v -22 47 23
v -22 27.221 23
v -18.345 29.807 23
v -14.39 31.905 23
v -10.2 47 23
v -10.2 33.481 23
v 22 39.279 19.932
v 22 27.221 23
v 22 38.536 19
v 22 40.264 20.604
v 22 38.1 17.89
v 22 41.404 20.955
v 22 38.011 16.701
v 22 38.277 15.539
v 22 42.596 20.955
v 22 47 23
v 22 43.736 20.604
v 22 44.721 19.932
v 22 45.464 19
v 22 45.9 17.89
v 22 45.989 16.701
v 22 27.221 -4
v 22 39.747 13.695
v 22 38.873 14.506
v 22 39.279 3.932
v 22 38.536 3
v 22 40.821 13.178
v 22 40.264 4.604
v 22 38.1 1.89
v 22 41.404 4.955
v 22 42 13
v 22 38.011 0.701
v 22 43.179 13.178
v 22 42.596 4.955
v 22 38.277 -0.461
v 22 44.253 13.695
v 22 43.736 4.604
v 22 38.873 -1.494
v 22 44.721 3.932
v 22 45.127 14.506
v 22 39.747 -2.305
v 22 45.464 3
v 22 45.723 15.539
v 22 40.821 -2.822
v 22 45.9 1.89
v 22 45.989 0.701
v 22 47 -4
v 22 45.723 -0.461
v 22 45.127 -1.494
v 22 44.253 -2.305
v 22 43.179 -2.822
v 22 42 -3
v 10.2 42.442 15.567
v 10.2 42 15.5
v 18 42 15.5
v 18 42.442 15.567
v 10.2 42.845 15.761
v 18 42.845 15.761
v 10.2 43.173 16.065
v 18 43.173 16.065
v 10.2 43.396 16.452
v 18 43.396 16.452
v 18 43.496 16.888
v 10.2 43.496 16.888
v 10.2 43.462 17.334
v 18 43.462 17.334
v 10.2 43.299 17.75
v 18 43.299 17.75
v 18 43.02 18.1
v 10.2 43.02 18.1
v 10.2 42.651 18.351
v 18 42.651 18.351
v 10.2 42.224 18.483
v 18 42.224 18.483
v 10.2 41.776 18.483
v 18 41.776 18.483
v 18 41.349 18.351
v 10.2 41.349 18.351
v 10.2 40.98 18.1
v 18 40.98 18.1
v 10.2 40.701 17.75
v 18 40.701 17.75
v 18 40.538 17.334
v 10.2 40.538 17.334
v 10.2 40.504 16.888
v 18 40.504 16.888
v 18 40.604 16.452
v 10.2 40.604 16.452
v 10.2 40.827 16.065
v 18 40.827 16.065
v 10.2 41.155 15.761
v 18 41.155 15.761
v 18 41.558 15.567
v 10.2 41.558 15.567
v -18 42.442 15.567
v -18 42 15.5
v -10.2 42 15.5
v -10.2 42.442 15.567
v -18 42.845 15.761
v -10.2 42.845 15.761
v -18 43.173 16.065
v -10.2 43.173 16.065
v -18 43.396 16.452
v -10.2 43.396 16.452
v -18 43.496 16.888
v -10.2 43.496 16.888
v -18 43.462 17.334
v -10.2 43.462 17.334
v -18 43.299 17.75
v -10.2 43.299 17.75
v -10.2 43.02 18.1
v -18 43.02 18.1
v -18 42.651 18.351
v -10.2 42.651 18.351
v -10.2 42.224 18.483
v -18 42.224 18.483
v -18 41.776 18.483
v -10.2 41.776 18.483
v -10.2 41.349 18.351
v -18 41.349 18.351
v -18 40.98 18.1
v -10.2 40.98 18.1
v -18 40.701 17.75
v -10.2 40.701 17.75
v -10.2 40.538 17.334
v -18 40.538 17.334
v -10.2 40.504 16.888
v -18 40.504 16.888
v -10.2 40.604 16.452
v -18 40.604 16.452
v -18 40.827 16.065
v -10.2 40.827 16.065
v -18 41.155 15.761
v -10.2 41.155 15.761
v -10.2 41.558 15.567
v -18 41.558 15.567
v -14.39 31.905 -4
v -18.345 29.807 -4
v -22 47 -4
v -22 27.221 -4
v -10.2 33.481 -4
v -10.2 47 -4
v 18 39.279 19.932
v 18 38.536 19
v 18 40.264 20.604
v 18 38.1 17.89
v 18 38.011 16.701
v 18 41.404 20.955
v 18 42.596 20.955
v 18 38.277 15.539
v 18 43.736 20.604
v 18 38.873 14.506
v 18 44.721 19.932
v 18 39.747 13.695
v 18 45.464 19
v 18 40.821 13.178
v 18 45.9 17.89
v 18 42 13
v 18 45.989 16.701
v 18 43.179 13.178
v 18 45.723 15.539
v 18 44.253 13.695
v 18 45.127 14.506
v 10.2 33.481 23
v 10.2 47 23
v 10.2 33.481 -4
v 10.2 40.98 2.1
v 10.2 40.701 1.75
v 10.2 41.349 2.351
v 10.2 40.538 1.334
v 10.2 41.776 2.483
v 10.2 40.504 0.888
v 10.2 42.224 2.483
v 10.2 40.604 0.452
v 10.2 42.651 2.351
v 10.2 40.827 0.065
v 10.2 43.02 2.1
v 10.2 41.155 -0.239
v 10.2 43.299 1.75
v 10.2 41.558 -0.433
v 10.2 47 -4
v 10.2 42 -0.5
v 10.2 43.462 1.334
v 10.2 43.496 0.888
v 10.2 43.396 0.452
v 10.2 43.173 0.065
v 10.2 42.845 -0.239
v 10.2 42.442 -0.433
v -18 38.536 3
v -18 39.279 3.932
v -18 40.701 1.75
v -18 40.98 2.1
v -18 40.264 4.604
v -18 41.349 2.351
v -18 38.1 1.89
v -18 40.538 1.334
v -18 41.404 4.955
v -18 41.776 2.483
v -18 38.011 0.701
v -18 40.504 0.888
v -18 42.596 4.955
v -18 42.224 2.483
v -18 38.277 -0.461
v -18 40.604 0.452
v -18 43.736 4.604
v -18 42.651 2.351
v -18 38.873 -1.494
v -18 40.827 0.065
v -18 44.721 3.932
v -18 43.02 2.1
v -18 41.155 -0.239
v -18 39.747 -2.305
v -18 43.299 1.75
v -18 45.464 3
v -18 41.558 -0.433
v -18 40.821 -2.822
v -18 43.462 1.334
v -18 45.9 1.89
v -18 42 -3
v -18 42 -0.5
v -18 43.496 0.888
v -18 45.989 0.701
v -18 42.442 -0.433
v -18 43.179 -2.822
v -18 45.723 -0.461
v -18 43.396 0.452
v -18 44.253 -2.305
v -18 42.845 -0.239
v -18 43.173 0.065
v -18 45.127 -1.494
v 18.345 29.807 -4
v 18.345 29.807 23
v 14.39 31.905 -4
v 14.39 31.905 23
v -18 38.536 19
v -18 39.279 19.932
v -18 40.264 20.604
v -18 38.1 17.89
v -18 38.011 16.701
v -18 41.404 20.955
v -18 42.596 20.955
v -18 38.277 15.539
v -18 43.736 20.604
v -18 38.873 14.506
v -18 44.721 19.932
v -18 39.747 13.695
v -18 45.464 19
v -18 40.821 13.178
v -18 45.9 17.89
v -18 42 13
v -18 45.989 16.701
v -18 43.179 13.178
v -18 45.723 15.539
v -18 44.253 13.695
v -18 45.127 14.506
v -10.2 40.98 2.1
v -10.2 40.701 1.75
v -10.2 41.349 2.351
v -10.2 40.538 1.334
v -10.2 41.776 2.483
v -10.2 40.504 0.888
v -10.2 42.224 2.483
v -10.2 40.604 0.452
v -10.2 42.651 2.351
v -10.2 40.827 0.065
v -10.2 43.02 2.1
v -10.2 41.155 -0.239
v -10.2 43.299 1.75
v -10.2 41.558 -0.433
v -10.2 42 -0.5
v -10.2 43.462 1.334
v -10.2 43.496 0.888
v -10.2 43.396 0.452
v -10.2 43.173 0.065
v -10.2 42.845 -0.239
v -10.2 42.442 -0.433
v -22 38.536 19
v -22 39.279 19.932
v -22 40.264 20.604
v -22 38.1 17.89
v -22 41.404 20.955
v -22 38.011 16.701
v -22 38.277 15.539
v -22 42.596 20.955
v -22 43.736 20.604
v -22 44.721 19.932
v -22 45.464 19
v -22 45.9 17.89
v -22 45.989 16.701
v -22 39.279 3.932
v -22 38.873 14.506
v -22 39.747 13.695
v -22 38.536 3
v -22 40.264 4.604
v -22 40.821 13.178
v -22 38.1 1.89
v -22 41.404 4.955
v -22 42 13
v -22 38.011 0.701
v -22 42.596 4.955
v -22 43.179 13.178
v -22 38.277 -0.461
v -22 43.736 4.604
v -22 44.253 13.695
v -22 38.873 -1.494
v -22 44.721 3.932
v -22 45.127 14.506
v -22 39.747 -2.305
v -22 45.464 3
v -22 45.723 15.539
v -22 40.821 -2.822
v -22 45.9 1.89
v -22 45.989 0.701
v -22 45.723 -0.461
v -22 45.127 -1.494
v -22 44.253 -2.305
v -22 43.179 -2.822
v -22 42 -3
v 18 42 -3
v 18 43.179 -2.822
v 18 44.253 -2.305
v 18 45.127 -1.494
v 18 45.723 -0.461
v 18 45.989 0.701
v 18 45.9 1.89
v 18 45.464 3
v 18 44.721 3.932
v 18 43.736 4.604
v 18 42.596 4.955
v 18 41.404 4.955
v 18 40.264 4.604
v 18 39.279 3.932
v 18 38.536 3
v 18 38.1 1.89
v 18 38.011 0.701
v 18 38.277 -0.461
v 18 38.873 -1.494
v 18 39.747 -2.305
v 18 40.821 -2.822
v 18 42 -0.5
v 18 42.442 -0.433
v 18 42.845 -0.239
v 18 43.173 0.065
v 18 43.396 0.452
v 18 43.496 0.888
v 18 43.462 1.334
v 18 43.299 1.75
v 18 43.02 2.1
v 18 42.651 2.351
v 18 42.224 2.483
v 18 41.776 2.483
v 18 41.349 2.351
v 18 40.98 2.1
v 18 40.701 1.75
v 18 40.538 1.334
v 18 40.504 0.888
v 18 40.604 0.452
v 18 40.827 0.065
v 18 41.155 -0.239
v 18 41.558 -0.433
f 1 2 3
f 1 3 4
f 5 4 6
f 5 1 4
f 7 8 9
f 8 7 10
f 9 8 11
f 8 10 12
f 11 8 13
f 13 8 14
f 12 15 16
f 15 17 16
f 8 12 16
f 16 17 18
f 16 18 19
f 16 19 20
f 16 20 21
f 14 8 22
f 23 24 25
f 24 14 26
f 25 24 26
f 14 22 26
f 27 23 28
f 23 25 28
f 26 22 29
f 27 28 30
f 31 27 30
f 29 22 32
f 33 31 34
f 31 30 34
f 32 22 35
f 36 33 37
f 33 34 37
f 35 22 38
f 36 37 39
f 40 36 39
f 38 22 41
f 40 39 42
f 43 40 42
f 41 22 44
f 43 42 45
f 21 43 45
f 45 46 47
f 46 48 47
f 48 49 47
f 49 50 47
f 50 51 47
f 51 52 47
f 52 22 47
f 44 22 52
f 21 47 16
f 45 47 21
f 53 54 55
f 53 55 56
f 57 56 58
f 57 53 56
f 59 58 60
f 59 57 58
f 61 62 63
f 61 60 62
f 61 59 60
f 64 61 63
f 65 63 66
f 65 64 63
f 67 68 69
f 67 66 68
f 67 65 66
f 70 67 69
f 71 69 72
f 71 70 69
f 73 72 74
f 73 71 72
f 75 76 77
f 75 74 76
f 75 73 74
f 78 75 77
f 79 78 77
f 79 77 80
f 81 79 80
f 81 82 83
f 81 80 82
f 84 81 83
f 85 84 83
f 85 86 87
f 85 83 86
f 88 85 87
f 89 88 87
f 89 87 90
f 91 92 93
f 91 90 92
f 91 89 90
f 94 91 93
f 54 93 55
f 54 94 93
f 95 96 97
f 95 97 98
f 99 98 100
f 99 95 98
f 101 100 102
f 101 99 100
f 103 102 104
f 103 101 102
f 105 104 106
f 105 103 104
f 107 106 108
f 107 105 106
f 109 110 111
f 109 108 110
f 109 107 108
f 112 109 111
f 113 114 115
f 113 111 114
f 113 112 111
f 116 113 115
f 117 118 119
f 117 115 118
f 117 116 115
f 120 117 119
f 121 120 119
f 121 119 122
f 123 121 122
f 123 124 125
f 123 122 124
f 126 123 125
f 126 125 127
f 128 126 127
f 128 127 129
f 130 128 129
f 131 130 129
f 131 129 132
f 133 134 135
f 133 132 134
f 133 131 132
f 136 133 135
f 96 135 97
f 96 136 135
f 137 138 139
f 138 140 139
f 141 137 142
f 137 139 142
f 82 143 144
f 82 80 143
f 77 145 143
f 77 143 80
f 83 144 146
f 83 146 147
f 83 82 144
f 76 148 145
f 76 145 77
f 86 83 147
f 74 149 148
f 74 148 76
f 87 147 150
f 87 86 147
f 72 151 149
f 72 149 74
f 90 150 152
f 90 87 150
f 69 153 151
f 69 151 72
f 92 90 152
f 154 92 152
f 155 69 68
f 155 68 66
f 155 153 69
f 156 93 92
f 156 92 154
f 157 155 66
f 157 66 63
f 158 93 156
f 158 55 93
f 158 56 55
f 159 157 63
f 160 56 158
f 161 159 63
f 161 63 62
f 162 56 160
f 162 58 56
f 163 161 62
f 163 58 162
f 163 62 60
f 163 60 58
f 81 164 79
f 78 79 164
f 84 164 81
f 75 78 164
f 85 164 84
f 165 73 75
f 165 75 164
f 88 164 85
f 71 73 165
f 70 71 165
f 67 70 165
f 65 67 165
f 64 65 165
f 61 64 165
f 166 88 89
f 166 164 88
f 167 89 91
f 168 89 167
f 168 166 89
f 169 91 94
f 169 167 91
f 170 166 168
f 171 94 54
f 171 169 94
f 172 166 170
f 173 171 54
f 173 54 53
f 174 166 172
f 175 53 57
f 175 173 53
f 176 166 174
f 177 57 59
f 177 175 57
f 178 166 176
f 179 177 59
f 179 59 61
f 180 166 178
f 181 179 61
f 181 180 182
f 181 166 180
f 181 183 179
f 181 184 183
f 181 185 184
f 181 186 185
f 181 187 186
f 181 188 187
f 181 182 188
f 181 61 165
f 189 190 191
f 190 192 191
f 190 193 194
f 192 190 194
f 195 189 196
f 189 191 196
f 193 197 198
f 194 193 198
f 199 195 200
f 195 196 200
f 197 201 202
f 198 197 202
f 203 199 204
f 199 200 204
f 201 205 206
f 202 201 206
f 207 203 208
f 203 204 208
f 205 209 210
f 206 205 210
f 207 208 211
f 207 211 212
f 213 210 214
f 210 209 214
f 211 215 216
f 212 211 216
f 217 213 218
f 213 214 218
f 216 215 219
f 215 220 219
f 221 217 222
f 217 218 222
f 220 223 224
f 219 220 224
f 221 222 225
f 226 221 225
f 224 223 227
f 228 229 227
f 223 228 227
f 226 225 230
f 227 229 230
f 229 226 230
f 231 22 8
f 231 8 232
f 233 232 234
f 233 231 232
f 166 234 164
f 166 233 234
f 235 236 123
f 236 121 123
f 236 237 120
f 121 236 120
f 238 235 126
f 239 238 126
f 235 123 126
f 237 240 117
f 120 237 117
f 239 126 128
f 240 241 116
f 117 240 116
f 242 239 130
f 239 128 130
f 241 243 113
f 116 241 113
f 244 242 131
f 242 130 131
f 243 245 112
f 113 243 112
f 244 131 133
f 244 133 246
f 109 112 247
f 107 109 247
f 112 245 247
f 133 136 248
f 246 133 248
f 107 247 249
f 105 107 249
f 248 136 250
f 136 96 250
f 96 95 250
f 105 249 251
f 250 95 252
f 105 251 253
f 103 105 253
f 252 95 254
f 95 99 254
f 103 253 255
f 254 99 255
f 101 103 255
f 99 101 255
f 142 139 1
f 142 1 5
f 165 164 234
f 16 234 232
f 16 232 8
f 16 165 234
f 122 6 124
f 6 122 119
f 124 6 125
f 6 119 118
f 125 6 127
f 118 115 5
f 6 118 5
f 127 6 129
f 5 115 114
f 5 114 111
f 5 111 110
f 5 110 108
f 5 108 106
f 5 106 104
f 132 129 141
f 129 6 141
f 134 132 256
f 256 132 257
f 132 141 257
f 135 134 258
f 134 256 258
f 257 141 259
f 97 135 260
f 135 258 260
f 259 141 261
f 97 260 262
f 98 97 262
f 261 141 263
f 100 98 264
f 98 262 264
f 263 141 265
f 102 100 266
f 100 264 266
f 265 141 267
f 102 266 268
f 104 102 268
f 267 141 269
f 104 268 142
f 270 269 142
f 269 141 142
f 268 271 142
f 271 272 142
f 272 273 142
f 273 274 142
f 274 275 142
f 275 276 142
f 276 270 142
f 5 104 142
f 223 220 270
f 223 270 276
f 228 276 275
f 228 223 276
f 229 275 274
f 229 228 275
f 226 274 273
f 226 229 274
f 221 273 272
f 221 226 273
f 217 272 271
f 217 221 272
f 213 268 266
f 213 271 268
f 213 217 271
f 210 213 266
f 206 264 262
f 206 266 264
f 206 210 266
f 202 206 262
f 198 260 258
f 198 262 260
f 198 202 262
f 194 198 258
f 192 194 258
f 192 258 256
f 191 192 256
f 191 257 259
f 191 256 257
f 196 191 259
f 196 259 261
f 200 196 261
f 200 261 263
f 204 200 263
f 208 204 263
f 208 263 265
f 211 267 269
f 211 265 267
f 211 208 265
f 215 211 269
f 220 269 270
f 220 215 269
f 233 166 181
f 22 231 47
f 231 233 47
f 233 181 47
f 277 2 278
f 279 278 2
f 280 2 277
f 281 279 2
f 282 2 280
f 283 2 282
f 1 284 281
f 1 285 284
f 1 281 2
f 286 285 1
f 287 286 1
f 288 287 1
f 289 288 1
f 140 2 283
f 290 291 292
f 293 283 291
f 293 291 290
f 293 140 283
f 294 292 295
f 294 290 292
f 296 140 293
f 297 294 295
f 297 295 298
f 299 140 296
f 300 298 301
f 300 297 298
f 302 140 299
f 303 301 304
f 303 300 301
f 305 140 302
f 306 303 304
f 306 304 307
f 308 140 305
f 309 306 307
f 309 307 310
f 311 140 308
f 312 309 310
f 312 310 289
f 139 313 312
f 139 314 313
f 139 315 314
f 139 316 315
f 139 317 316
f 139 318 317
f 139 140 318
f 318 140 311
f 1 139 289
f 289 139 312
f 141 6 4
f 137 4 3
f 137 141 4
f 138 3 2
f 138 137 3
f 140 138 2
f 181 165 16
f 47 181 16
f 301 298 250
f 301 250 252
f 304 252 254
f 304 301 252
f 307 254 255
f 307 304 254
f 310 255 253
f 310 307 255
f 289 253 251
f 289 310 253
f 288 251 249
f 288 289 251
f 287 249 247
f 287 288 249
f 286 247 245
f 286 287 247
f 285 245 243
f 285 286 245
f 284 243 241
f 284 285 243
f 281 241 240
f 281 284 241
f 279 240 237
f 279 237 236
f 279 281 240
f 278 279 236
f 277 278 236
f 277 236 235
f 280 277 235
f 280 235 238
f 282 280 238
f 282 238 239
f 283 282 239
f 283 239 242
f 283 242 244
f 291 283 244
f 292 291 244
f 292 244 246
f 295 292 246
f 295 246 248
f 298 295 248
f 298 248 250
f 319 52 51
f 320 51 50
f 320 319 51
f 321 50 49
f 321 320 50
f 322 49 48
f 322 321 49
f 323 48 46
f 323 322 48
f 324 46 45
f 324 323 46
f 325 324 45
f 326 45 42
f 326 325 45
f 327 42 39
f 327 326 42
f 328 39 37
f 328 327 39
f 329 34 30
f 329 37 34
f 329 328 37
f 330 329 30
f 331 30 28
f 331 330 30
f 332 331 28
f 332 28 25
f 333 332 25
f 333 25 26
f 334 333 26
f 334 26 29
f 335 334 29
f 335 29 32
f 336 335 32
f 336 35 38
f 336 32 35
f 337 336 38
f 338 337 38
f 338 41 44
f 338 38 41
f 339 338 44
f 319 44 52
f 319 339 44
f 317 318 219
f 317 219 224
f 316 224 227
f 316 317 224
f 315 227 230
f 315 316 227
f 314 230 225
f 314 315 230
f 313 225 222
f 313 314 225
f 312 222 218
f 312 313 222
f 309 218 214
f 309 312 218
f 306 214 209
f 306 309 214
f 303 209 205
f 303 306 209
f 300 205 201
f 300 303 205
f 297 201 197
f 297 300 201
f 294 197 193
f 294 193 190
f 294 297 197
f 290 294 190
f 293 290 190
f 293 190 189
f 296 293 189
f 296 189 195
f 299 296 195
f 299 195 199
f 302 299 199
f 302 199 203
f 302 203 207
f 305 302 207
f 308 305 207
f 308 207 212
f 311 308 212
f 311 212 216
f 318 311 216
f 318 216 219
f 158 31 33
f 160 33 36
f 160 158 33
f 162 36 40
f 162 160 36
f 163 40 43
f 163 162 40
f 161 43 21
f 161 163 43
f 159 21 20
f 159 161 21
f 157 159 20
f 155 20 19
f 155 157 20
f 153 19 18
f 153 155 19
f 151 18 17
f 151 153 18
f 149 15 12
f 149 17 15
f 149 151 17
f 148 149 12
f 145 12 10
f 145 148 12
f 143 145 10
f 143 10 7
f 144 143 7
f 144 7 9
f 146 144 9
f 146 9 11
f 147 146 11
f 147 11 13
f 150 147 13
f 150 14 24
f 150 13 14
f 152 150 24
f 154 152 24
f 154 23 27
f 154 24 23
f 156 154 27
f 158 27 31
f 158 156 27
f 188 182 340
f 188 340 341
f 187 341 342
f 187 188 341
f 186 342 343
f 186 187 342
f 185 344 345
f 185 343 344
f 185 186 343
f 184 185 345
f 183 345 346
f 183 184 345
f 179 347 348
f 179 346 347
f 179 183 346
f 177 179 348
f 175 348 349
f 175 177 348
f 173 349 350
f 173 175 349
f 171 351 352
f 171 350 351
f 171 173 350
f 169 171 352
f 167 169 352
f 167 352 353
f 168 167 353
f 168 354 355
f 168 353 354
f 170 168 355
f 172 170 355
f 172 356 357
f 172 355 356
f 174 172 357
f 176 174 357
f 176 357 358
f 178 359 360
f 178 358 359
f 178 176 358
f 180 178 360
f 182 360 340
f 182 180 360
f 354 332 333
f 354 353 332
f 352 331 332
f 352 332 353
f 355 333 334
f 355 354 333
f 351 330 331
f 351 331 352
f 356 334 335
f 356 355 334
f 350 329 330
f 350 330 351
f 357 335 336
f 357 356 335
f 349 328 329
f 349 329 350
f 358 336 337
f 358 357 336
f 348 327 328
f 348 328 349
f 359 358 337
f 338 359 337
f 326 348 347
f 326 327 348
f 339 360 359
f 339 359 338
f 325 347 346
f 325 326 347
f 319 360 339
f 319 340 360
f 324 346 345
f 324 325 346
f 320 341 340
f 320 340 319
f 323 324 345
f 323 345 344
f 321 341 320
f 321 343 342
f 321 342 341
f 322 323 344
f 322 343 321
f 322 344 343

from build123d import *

# Parameters (mm, degrees)
CYLINDER1796_R     = 1.5
CYLINDER1796_DEPTH = 64
CYLINDER1795_R     = 1.5
CYLINDER1795_DEPTH = 64
CYLINDER1800_R     = 4
CYLINDER1800_DEPTH = 16
CYLINDER1799_R     = 4
CYLINDER1799_DEPTH = 16
CYLINDER1798_R     = 4
CYLINDER1798_DEPTH = 16
CYLINDER1797_R     = 4
CYLINDER1797_DEPTH = 16
CYLINDER1793_R     = 35
CYLINDER1793_DEPTH = 32
BOX712_W           = 20.4
BOX712_H           = 27
BOX712_DEPTH       = 28
BOX711_W           = 44
BOX711_H           = 32
BOX711_DEPTH       = 27


with BuildPart() as v_lec1796:
    # Cylinder1796 → Cylinder1796 (new body)
    with BuildSketch(Plane(origin=(-32, 42, 17), x_dir=(0, 0, -1), z_dir=(1, 0, 0))):
        Circle(CYLINDER1796_R)
    extrude(amount=CYLINDER1796_DEPTH)


with BuildPart() as compound891:
    # Cylinder1795 → Cylinder1795 (new body)
    with BuildSketch(Plane(origin=(-32, 42, 1), x_dir=(0, 0, -1), z_dir=(1, 0, 0))):
        Circle(CYLINDER1795_R)
    extrude(amount=CYLINDER1795_DEPTH)

    # Compound891: union Válec1796
    add(v_lec1796.part)


with BuildPart() as v_lec1800:
    # Cylinder1800 → Cylinder1800 (new body)
    with BuildSketch(Plane(origin=(18, 42, 17), x_dir=(0, 0, -1), z_dir=(1, 0, 0))):
        Circle(CYLINDER1800_R)
    extrude(amount=CYLINDER1800_DEPTH)


with BuildPart() as v_lec1799:
    # Cylinder1799 → Cylinder1799 (new body)
    with BuildSketch(Plane(origin=(18, 42, 1), x_dir=(0, 0, -1), z_dir=(1, 0, 0))):
        Circle(CYLINDER1799_R)
    extrude(amount=CYLINDER1799_DEPTH)


with BuildPart() as v_lec1798:
    # Cylinder1798 → Cylinder1798 (new body)
    with BuildSketch(Plane(origin=(-34, 42, 17), x_dir=(0, 0, -1), z_dir=(1, 0, 0))):
        Circle(CYLINDER1798_R)
    extrude(amount=CYLINDER1798_DEPTH)


with BuildPart() as compound892:
    # Cylinder1797 → Cylinder1797 (new body)
    with BuildSketch(Plane(origin=(-34, 42, 1), x_dir=(0, 0, -1), z_dir=(1, 0, 0))):
        Circle(CYLINDER1797_R)
    extrude(amount=CYLINDER1797_DEPTH)

    # Compound892: union Válec1800, Válec1799, Válec1798
    add(v_lec1800.part)
    add(v_lec1799.part)
    add(v_lec1798.part)


with BuildPart() as v_lec1793:
    # Cylinder1793 → Cylinder1793 (new body)
    with BuildSketch(Plane.XY.offset(-3)):
        Circle(CYLINDER1793_R)
    extrude(amount=CYLINDER1793_DEPTH)


with BuildPart() as krychle712:
    # Box712 → Box712 (new body)
    with BuildSketch(Plane(origin=(-10.2, 20, -3), x_dir=(1, 0, 0), z_dir=(0, 0, 1))):
        with Locations((10.2, 13.5)):
            Rectangle(BOX712_W, BOX712_H)
    extrude(amount=BOX712_DEPTH)


with BuildPart() as cut529:
    # Box711 → Box711 (new body)
    with BuildSketch(Plane(origin=(-22, 15, -3), x_dir=(1, 0, 0), z_dir=(0, 0, 1))):
        with Locations((22, 16)):
            Rectangle(BOX711_W, BOX711_H)
    extrude(amount=BOX711_DEPTH)

    # Cut524: cut Krychle712
    add(krychle712.part, mode=Mode.SUBTRACT)

    # Cut527: cut Válec1793
    add(v_lec1793.part, mode=Mode.SUBTRACT)


with BuildPart() as cut529_1:
    # Cut527 placement: moved
    add(cut529.part.moved(Location((0, 0, -1))))

    # Cut528: cut Compound892
    add(compound892.part, mode=Mode.SUBTRACT)

    # Cut529: cut Compound891
    add(compound891.part, mode=Mode.SUBTRACT)


solid = cut529_1.part
